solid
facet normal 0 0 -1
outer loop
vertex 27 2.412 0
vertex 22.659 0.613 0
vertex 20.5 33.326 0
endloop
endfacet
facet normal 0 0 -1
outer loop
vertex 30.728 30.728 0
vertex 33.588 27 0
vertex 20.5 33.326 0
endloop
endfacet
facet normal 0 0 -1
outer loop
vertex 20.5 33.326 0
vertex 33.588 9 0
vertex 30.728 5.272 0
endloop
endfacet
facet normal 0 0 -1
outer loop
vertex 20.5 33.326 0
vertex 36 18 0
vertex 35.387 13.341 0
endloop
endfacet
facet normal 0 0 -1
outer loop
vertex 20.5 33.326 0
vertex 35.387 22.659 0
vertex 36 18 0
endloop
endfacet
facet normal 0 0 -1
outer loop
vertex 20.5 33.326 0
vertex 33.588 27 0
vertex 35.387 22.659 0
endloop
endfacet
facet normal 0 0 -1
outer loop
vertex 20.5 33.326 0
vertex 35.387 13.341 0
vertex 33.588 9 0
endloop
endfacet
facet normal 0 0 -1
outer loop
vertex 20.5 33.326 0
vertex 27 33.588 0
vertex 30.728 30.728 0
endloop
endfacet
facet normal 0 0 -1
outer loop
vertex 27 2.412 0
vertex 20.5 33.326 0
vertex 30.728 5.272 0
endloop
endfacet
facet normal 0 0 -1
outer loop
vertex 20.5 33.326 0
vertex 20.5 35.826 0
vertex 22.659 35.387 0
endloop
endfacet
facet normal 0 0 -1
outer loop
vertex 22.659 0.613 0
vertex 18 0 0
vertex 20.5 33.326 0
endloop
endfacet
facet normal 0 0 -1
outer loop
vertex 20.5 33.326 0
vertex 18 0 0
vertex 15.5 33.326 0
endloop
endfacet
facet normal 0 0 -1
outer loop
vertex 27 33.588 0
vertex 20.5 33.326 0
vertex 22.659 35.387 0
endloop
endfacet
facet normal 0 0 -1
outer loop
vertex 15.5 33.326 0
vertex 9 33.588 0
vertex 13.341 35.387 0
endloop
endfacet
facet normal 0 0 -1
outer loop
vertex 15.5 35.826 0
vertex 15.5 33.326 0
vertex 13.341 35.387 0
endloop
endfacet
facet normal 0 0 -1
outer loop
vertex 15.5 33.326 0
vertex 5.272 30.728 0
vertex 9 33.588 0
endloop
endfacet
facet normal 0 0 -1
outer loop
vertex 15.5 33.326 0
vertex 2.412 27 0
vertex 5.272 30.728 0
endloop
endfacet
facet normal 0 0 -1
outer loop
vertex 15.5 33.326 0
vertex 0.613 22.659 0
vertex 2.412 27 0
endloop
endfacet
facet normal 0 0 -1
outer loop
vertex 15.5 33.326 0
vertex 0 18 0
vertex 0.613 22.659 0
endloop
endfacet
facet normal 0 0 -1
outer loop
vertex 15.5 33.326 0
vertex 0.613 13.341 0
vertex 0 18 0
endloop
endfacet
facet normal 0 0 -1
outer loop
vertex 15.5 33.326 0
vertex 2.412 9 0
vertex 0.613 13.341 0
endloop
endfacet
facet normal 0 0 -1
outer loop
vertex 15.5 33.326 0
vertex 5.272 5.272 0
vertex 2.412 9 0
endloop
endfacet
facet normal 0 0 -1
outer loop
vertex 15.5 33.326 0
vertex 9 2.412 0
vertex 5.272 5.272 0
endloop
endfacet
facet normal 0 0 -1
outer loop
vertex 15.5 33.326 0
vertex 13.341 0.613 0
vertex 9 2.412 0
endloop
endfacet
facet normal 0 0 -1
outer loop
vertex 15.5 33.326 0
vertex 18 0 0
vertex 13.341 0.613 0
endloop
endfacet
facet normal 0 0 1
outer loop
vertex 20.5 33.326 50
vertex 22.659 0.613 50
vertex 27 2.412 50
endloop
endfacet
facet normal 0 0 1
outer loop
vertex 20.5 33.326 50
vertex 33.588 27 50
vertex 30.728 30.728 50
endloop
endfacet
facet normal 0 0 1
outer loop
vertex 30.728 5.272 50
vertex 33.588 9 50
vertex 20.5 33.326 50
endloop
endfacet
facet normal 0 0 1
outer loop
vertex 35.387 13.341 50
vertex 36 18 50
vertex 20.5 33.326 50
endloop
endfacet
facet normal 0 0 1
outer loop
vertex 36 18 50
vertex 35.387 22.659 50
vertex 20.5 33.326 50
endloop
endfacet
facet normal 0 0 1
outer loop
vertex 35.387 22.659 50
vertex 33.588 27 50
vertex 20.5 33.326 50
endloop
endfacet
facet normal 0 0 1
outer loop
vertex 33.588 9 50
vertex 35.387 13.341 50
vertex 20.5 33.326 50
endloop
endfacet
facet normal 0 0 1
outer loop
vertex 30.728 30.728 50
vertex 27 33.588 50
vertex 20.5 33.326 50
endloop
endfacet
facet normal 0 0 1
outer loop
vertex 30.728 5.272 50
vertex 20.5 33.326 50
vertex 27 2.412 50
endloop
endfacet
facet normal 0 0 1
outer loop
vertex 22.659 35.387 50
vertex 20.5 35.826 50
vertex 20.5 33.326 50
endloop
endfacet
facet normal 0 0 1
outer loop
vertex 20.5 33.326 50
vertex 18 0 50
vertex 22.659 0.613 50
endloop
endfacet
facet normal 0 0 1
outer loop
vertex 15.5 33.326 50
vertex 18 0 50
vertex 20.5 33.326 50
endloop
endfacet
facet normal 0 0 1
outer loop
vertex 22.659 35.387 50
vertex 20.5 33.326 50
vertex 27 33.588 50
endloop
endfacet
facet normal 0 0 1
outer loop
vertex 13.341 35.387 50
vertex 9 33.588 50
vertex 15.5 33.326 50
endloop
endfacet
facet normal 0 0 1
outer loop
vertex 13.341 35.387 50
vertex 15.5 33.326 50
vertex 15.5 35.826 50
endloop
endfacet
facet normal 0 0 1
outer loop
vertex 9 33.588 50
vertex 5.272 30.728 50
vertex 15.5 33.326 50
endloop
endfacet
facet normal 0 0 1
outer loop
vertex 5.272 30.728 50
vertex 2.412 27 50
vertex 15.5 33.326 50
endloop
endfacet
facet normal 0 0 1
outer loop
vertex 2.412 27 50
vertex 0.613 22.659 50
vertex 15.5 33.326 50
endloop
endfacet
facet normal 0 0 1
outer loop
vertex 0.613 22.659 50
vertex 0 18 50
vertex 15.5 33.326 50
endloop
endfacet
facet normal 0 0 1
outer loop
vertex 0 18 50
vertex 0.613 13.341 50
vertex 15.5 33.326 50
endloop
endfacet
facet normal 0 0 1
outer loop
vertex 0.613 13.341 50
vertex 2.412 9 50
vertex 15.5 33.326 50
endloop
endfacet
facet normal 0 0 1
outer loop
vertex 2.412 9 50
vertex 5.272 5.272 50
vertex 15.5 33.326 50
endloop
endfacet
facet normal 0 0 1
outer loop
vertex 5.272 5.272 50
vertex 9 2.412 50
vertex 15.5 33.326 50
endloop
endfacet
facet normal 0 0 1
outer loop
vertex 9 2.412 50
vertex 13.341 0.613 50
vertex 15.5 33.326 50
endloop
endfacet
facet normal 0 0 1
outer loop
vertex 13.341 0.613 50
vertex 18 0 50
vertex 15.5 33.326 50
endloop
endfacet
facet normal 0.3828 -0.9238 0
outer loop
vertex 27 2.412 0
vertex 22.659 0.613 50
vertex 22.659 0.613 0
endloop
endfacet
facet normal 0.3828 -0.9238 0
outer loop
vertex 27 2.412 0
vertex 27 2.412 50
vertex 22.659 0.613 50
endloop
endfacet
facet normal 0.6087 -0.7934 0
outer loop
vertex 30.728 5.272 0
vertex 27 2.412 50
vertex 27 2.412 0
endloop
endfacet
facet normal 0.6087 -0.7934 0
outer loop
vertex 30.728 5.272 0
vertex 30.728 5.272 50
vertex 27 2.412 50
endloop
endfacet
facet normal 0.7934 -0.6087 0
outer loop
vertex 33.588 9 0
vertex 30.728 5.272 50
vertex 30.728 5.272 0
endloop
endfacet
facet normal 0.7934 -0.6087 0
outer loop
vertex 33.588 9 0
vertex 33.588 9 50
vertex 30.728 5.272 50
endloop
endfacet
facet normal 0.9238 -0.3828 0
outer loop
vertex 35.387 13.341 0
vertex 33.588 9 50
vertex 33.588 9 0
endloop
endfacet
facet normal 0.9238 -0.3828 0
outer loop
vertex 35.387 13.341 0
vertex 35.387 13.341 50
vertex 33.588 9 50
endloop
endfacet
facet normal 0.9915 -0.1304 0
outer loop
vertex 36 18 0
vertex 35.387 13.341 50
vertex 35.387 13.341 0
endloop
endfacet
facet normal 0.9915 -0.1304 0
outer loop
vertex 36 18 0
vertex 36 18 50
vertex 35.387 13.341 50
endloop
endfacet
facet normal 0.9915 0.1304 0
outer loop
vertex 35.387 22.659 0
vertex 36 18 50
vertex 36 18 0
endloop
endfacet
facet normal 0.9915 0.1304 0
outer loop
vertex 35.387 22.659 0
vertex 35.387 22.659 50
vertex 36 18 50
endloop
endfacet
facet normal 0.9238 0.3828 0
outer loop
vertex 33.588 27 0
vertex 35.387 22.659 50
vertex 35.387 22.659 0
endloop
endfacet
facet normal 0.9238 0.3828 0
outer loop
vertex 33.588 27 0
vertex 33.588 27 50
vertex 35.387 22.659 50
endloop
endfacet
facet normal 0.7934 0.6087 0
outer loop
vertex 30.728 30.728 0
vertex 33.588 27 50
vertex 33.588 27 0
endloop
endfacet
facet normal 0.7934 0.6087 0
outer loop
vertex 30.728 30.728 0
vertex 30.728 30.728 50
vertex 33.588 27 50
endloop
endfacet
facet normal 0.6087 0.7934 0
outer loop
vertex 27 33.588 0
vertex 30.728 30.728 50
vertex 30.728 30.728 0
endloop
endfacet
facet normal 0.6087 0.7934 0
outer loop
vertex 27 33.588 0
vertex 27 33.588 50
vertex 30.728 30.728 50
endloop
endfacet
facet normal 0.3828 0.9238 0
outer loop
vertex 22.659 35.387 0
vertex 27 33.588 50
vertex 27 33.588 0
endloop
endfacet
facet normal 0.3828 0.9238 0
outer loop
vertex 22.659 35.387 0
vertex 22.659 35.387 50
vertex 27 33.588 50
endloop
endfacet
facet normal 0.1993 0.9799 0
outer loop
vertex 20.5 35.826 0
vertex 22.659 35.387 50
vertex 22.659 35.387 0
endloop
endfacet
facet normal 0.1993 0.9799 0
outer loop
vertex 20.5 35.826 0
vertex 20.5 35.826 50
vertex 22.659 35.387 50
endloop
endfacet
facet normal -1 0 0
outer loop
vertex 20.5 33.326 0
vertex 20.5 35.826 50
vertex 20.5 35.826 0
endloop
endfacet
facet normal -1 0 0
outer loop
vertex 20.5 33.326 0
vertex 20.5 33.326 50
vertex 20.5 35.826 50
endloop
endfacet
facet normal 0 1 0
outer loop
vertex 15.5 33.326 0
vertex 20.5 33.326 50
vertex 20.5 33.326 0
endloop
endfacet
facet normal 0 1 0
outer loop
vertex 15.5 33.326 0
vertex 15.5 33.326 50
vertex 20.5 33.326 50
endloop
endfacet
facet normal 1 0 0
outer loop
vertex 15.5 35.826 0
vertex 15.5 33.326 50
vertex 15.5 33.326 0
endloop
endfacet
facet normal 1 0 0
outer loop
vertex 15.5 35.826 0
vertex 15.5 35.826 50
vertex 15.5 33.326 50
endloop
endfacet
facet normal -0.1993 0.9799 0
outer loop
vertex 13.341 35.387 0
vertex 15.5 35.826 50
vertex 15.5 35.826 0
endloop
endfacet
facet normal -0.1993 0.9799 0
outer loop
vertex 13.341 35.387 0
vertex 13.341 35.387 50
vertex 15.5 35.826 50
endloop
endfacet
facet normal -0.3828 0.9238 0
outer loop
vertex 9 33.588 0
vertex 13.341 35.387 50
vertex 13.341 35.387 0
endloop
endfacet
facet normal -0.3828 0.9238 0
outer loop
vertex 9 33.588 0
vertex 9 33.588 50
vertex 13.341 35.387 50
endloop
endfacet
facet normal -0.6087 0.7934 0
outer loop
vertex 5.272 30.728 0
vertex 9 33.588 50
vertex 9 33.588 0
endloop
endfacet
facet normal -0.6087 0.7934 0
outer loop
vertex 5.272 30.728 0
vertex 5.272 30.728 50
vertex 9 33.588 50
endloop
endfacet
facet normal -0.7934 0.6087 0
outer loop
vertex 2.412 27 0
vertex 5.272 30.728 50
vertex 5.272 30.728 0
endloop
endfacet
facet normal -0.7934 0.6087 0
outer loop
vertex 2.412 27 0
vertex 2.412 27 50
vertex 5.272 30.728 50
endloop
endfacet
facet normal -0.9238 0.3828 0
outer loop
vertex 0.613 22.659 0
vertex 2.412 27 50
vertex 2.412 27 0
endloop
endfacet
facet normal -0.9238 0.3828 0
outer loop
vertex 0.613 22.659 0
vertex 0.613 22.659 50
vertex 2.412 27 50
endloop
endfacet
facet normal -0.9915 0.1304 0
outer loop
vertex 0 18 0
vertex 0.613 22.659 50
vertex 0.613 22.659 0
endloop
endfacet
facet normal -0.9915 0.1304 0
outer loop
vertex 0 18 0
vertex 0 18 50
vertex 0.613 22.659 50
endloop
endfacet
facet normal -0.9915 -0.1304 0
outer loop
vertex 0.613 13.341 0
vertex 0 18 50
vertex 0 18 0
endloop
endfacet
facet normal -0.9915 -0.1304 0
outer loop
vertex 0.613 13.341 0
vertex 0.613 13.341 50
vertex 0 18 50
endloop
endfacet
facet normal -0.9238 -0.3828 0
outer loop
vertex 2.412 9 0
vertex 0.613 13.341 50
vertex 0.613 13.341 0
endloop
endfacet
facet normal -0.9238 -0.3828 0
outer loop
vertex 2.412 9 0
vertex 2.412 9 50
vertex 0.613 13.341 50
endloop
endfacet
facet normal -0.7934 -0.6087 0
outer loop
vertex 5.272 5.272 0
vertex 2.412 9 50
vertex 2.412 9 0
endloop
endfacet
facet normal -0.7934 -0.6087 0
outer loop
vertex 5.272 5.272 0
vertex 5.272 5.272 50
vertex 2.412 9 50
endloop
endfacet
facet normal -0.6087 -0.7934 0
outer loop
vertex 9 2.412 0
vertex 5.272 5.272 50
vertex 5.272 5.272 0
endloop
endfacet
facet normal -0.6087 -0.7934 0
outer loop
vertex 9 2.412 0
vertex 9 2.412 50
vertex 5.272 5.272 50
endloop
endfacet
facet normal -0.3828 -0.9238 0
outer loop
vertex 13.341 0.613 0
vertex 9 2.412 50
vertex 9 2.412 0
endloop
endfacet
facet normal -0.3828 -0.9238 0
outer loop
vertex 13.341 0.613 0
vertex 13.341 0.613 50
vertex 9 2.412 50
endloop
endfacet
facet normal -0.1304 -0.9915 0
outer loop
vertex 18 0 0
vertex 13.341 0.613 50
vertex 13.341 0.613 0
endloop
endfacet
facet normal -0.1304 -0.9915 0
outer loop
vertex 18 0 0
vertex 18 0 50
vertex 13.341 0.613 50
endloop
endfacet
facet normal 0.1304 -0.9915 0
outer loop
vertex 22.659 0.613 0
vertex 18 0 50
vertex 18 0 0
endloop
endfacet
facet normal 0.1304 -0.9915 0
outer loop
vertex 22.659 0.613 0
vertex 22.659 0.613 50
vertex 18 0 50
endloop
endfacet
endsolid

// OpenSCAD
$fn = 32;

// ----------------------------------------------------------------------
// Keyway shaft: d36 shaft, key 5 x 2.5 mm
// ----------------------------------------------------------------------

// --- parameters (mm) ---
shaft_r = 18;             // shaft radius
key_w = 5;                // keyway width
key_d = 2.5;              // keyway depth below the surface line
plate_t = 50;             // shaft length, Z (extrusion height)

shaft_d = 2 * shaft_r;  // shaft diameter
circle_step = 15;  // polygon sampling step, degrees

profile = [[13.341, 35.387], [9, 33.588], [5.272, 30.728], [2.412, 27], [0.613, 22.659], [0, 18], [0.613, 13.341], [2.412, 9], [5.272, 5.272], [9, 2.412], [13.341, 0.613], [18, 0], [22.659, 0.613], [27, 2.412], [30.728, 5.272], [33.588, 9], [35.387, 13.341], [36, 18], [35.387, 22.659], [33.588, 27], [30.728, 30.728], [27, 33.588], [22.659, 35.387], [20.5, 35.826], [20.5, 33.326], [15.5, 33.326], [15.5, 35.826]];  // primary outline, 27 points, counter clockwise

// --- the one profile operation ---
linear_extrude(height = plate_t) polygon(points = profile);
